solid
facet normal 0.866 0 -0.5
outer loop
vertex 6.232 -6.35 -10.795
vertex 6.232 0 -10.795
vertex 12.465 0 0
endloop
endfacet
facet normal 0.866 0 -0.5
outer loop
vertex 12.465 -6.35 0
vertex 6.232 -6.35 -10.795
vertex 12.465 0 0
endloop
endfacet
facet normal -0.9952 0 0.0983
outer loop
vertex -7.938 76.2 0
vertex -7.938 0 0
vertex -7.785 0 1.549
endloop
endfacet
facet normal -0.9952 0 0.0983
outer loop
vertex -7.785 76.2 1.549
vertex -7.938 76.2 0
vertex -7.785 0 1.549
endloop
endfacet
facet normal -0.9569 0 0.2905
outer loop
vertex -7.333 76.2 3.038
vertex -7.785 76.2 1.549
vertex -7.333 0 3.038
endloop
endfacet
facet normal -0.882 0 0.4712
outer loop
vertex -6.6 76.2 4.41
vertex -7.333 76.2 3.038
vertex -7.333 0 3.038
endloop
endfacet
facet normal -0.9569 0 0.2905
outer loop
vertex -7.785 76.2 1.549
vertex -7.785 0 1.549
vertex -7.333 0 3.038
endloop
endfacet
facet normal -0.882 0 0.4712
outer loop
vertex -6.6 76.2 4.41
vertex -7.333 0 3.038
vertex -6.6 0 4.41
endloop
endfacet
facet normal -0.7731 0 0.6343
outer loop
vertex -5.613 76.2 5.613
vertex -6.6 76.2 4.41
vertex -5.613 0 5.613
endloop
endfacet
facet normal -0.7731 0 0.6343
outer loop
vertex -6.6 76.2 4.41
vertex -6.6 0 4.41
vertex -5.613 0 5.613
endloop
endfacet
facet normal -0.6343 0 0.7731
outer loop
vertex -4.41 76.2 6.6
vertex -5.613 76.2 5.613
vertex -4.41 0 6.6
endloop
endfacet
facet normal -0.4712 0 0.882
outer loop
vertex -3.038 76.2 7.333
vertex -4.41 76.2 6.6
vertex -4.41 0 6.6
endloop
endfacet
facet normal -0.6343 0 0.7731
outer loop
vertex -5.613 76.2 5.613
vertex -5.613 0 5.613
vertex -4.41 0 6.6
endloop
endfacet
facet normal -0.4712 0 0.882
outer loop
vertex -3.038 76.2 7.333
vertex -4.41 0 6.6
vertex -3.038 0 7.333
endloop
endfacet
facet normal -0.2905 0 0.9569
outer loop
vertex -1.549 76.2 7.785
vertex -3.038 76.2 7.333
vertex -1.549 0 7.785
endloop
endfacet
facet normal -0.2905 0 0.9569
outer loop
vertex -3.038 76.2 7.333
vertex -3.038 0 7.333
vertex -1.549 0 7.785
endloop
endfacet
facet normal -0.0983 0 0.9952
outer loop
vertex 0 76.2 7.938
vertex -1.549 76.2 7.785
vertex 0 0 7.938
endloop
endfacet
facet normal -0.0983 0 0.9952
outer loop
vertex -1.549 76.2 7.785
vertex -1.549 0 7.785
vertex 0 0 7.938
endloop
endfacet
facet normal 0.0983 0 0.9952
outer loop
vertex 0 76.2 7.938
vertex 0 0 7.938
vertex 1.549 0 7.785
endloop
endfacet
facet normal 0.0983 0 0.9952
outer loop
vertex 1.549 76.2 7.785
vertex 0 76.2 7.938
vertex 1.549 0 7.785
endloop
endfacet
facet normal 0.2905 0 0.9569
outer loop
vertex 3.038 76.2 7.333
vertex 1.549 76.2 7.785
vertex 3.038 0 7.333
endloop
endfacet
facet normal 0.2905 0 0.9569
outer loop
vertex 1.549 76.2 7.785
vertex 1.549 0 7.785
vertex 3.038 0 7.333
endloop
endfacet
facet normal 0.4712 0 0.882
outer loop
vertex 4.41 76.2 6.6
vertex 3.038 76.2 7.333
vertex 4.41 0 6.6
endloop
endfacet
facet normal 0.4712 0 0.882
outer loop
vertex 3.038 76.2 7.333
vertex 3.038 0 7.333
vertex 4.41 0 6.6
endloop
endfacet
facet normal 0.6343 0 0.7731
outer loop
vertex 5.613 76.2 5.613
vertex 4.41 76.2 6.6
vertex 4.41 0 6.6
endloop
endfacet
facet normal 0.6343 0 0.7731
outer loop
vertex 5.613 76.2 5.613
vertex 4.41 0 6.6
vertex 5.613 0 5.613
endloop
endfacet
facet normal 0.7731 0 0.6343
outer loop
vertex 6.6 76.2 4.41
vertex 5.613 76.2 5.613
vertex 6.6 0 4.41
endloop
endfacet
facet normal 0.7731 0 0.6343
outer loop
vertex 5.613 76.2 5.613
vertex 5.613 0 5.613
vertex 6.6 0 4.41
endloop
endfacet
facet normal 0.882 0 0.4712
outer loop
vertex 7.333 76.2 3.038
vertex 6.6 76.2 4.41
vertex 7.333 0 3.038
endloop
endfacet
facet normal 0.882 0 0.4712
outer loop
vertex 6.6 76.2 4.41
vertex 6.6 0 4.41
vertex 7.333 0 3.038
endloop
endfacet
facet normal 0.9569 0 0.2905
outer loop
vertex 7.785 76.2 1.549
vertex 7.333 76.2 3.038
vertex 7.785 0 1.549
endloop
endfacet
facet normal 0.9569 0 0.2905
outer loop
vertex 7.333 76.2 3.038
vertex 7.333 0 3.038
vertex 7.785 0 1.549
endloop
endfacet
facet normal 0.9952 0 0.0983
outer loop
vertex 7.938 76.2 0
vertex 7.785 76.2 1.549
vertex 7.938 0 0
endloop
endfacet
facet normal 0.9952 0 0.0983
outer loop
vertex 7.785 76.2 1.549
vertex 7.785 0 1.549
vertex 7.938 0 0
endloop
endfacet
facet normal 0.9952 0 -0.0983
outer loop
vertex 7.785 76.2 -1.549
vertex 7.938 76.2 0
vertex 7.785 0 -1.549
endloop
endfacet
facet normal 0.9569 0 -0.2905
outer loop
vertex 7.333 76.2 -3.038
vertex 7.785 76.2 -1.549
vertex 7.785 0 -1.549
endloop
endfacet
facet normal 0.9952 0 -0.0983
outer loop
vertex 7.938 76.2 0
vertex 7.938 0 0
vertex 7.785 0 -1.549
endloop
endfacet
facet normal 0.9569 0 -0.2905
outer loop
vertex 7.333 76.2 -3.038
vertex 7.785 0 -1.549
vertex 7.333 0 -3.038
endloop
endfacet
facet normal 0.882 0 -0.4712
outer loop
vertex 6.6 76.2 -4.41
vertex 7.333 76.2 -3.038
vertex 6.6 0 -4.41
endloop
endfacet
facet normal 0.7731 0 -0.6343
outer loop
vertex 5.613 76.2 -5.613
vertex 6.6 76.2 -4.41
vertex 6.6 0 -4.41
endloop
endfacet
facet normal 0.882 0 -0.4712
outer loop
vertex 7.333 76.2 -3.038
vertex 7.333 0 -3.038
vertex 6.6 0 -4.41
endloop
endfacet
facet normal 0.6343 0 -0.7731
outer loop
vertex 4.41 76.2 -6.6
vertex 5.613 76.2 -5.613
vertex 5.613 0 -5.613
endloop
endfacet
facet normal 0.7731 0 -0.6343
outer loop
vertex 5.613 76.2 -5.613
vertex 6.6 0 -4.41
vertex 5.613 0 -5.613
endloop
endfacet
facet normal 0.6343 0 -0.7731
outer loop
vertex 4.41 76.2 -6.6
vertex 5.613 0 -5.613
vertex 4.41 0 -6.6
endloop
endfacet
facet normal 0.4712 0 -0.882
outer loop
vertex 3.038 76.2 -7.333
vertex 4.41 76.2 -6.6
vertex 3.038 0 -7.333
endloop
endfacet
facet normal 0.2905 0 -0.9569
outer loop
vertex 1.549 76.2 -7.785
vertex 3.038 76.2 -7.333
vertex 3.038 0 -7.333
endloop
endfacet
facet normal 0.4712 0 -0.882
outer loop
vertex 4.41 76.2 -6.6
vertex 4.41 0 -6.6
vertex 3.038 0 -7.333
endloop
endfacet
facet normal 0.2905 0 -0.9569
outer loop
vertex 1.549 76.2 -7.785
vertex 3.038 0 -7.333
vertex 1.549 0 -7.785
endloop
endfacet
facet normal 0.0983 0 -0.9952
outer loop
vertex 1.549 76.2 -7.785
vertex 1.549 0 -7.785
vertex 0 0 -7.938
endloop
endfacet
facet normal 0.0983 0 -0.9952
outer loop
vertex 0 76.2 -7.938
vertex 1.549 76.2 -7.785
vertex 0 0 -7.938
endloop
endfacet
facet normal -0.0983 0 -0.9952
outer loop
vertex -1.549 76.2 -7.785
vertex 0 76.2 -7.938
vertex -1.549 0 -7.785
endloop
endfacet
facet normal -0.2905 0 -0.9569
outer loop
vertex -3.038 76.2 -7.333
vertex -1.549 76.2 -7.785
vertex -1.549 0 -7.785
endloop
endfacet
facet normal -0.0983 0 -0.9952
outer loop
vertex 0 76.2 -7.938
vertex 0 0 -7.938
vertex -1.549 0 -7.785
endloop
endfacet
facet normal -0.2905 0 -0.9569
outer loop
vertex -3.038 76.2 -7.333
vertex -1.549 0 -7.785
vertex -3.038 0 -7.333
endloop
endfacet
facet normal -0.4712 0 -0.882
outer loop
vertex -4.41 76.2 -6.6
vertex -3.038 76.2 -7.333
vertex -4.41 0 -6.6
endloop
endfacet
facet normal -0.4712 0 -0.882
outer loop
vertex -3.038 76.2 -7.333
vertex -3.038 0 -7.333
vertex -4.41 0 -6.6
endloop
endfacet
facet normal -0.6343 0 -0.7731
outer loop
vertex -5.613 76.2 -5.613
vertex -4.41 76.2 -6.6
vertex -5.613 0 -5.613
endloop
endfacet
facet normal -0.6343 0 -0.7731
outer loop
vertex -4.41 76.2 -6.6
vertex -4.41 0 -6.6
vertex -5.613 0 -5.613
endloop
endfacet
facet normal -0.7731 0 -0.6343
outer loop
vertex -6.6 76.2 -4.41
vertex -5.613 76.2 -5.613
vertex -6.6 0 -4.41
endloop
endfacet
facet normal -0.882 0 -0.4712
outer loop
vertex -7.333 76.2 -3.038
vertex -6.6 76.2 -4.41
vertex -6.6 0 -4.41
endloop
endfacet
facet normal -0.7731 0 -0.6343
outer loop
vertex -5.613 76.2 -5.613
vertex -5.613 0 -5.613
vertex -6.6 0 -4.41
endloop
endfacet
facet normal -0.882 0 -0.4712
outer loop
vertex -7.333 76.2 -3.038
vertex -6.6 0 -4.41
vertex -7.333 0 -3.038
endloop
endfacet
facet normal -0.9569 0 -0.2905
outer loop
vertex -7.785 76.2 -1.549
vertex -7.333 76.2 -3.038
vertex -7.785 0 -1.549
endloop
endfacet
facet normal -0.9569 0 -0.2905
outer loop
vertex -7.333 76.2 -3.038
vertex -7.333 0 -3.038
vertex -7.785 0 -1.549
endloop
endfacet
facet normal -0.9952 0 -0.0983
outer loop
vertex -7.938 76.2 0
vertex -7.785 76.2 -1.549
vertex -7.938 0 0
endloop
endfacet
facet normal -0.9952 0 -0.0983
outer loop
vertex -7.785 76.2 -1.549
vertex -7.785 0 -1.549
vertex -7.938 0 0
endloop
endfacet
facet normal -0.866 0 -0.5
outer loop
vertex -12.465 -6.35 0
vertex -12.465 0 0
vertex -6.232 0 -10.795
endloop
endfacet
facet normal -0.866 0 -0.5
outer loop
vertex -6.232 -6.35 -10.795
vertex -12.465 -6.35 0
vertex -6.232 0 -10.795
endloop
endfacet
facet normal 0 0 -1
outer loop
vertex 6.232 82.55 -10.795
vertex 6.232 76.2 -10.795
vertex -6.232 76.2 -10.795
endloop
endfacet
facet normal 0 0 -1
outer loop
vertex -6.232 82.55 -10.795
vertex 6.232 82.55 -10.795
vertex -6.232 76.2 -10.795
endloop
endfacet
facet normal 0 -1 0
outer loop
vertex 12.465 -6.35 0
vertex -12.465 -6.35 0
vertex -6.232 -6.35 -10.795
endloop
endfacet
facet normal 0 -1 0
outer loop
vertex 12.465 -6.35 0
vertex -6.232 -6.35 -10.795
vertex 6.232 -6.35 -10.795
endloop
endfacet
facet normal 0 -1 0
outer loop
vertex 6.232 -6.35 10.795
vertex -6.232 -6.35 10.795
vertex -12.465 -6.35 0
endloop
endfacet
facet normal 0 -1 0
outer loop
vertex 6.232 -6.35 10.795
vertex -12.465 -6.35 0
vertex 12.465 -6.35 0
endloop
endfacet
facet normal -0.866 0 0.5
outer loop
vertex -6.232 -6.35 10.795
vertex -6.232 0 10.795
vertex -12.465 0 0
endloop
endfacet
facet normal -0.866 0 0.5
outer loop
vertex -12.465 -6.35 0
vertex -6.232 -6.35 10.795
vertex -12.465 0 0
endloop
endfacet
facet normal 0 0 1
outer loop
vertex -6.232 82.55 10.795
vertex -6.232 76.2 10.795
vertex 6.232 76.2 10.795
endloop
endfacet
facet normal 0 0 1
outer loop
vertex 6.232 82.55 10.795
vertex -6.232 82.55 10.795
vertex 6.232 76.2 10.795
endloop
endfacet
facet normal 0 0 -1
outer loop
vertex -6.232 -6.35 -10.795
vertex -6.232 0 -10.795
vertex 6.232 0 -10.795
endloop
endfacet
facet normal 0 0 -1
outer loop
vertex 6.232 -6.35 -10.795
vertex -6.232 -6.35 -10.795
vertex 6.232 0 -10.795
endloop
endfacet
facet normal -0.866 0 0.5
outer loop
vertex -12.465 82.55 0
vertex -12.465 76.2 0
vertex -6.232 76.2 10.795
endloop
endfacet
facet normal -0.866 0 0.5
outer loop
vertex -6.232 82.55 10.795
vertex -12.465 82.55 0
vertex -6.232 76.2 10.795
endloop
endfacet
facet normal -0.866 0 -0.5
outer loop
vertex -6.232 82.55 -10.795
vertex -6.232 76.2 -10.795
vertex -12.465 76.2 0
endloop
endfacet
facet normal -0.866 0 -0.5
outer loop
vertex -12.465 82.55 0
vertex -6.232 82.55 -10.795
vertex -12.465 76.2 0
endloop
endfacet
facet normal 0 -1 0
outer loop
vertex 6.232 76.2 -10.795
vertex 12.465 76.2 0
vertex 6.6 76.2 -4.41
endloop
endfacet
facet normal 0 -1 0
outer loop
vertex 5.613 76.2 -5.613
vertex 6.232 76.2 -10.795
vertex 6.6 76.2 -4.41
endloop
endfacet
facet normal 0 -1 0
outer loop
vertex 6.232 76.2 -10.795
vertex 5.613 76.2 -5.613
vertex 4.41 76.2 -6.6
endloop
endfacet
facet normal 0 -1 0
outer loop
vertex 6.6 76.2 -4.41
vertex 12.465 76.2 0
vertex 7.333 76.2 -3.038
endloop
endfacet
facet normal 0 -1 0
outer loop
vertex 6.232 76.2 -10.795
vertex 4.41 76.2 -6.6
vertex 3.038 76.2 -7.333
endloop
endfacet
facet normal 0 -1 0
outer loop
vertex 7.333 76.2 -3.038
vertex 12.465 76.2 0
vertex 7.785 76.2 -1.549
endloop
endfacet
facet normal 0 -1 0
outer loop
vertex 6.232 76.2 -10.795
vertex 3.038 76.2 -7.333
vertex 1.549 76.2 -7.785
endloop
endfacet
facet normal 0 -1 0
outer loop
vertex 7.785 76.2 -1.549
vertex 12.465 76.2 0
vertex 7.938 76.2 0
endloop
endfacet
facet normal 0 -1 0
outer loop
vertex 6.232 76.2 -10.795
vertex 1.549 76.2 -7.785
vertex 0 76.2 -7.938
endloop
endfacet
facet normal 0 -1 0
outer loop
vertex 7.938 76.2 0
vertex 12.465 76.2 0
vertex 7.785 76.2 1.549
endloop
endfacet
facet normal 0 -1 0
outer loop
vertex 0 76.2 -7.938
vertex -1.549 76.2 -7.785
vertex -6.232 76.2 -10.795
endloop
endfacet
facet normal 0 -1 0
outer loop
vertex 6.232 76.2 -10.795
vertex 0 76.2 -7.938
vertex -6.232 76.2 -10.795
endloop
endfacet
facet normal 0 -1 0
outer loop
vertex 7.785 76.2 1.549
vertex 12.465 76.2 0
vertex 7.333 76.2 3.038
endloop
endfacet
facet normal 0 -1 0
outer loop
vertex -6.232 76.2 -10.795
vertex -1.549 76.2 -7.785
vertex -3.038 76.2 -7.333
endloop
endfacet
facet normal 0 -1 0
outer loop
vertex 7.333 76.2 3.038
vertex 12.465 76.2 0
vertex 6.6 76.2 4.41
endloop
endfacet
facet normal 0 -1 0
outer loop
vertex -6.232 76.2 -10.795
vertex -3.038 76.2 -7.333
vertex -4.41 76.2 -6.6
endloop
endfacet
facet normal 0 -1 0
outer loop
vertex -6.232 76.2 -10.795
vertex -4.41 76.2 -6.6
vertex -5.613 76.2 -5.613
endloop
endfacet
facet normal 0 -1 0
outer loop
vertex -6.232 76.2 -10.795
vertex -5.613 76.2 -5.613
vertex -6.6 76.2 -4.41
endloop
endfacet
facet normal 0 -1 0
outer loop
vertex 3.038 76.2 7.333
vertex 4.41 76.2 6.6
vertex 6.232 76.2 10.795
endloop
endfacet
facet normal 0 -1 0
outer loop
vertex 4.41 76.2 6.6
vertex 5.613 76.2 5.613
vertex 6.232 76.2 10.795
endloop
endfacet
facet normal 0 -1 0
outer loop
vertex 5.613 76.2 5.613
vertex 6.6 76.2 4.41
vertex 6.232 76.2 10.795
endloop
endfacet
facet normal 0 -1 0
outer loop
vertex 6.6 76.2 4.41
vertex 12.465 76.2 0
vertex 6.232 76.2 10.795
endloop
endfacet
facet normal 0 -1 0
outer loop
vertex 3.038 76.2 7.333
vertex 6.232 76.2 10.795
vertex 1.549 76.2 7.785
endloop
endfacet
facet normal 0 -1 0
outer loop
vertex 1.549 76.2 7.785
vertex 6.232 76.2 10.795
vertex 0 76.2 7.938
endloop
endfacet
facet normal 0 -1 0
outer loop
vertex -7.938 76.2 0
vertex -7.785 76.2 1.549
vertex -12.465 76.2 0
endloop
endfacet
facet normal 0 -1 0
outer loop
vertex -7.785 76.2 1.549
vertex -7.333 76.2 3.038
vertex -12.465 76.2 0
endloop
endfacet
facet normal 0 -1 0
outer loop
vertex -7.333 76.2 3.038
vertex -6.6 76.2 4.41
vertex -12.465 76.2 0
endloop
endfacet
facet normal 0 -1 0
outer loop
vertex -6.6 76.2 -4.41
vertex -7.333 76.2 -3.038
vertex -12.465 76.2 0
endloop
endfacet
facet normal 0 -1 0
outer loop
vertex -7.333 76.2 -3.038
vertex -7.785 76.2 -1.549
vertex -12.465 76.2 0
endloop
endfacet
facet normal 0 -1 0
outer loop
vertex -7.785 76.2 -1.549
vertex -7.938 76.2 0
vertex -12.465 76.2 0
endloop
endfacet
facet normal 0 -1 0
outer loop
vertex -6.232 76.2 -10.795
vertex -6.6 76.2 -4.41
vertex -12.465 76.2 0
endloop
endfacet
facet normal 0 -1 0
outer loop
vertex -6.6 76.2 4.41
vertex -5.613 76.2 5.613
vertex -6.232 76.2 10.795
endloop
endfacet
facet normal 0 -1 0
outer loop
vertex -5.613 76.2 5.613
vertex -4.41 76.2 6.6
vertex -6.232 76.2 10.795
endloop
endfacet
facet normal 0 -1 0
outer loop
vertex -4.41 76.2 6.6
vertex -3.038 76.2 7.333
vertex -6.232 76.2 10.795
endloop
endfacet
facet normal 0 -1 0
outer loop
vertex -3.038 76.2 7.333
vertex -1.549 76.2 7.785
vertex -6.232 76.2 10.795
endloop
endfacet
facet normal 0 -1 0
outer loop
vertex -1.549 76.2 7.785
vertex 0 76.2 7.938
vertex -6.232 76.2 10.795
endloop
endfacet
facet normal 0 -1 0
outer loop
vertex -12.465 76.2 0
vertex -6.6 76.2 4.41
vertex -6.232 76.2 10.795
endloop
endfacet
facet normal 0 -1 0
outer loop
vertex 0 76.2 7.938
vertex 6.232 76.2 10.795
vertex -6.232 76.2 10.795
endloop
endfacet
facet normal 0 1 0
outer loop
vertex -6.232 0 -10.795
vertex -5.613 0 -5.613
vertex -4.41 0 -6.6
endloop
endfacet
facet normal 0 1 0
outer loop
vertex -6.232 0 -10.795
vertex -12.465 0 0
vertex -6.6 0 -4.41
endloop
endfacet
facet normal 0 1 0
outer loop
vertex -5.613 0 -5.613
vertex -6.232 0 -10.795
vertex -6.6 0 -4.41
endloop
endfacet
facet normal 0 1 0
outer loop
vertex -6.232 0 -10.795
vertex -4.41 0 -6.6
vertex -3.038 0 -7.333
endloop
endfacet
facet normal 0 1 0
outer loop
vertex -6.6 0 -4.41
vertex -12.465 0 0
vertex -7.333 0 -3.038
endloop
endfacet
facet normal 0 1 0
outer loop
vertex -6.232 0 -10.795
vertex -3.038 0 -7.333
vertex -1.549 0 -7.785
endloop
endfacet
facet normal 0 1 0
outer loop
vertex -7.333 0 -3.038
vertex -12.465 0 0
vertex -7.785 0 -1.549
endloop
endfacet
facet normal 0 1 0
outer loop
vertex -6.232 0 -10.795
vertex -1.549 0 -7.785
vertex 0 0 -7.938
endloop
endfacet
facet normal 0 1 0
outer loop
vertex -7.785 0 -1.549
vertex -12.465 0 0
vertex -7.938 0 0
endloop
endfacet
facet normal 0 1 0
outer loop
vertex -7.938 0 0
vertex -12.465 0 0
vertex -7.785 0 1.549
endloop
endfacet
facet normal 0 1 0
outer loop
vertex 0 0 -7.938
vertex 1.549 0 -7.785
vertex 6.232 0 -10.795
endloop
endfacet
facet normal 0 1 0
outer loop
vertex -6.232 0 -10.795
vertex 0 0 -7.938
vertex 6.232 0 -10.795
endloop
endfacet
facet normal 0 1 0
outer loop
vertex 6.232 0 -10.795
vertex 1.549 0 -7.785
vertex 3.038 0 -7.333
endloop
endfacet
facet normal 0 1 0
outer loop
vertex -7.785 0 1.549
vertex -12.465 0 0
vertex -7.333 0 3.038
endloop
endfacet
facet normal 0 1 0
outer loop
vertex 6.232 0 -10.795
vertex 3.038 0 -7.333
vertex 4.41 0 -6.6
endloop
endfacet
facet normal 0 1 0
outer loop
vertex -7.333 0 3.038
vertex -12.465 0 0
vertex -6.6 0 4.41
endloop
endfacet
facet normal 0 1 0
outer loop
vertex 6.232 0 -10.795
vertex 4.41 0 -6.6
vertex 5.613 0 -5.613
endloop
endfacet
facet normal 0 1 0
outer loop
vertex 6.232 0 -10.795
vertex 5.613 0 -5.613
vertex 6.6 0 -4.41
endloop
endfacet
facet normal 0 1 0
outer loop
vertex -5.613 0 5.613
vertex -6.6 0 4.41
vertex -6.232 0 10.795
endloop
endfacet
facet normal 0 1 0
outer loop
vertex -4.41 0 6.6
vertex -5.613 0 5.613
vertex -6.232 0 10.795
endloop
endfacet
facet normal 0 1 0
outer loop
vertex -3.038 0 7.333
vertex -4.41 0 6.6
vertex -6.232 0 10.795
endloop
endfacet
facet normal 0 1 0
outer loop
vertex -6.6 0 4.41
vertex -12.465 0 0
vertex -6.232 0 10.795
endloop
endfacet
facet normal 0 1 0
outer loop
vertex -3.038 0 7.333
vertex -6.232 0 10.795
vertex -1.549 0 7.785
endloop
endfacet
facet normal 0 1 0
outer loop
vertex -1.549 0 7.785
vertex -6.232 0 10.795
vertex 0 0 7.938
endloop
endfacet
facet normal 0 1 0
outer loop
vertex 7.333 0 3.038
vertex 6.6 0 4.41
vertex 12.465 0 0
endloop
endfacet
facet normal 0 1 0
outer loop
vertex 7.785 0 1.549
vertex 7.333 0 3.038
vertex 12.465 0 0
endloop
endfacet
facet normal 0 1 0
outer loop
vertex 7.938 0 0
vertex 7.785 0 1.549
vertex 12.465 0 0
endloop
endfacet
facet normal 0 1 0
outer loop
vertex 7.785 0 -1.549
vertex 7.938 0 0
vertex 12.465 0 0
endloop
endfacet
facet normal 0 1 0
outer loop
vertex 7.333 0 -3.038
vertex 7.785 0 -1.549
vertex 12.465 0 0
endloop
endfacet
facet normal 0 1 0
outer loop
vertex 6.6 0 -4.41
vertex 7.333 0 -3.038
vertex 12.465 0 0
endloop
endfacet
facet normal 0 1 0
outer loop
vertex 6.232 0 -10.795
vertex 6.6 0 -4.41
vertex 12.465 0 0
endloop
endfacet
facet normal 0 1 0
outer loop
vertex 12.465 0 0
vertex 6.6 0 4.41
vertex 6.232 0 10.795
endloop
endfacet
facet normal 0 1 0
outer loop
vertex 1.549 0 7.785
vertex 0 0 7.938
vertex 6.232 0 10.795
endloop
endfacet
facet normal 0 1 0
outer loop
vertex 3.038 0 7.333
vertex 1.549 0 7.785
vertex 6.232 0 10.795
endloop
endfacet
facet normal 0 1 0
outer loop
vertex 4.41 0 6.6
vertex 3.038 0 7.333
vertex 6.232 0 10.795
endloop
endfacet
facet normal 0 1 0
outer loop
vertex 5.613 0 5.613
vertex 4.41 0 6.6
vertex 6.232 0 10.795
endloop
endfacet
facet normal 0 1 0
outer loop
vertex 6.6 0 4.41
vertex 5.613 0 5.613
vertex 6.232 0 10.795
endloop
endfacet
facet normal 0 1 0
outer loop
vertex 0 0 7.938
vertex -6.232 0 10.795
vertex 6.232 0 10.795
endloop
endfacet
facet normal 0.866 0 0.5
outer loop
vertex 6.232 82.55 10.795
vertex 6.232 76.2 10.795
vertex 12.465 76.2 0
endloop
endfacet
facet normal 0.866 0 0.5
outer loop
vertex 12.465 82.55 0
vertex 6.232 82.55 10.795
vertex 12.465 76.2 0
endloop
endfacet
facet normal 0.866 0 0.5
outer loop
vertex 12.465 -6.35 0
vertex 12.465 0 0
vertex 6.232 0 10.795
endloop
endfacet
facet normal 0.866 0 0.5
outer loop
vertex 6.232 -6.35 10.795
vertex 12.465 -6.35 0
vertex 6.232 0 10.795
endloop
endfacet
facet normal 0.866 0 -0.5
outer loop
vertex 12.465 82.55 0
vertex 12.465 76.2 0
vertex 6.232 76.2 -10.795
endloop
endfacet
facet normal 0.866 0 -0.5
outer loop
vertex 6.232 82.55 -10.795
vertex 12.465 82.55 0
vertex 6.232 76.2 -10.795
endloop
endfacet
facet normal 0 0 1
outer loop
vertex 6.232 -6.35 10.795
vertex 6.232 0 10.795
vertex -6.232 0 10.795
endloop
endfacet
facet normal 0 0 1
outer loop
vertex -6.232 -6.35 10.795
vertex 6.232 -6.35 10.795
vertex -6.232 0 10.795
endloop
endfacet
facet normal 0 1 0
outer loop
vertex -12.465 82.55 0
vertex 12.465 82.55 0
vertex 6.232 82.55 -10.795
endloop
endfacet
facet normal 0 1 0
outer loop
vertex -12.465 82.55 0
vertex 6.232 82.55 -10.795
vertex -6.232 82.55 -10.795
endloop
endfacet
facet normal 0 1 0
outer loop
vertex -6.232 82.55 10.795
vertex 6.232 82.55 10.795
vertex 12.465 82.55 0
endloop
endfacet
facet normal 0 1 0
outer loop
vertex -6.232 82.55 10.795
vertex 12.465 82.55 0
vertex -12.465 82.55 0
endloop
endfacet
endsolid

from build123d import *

# Parameters (mm, degrees)
F1_DEPTH = 6.35
F2_R     = 7.9375
F3_DEPTH = 76.2
F4_R     = 7.9375
F5_DEPTH = 6.35


with BuildPart() as f1:
    # F0 (on Front) → F1 (new body)
    with BuildSketch(Plane.XZ):
        Polygon((12.464992, 0), (6.232496, 10.795), (-6.232496, 10.795), (-12.464992, 0), (-6.232496, -10.795), (6.232496, -10.795), align=None)
    extrude(amount=F1_DEPTH)

    # F2 (on face) → F3 (join)
    with BuildSketch(Plane(origin=(0, 0, 0), x_dir=(-1, 0, 0), z_dir=(0, 1, 0))):
        Circle(F2_R)
    extrude(amount=F3_DEPTH)

    # F4 (on face) → F5 (join)
    with BuildSketch(Plane(origin=(0, 76.2, 0), x_dir=(-1, 0, 0), z_dir=(0, 1, 0))):
        Polygon((12.464992, 0), (6.232496, 10.795), (-6.232496, 10.795), (-12.464992, 0), (-6.232496, -10.795), (6.232496, -10.795), align=None)
        Circle(F4_R, mode=Mode.SUBTRACT)
        Circle(F4_R)
    extrude(amount=F5_DEPTH)


solid = f1.part
